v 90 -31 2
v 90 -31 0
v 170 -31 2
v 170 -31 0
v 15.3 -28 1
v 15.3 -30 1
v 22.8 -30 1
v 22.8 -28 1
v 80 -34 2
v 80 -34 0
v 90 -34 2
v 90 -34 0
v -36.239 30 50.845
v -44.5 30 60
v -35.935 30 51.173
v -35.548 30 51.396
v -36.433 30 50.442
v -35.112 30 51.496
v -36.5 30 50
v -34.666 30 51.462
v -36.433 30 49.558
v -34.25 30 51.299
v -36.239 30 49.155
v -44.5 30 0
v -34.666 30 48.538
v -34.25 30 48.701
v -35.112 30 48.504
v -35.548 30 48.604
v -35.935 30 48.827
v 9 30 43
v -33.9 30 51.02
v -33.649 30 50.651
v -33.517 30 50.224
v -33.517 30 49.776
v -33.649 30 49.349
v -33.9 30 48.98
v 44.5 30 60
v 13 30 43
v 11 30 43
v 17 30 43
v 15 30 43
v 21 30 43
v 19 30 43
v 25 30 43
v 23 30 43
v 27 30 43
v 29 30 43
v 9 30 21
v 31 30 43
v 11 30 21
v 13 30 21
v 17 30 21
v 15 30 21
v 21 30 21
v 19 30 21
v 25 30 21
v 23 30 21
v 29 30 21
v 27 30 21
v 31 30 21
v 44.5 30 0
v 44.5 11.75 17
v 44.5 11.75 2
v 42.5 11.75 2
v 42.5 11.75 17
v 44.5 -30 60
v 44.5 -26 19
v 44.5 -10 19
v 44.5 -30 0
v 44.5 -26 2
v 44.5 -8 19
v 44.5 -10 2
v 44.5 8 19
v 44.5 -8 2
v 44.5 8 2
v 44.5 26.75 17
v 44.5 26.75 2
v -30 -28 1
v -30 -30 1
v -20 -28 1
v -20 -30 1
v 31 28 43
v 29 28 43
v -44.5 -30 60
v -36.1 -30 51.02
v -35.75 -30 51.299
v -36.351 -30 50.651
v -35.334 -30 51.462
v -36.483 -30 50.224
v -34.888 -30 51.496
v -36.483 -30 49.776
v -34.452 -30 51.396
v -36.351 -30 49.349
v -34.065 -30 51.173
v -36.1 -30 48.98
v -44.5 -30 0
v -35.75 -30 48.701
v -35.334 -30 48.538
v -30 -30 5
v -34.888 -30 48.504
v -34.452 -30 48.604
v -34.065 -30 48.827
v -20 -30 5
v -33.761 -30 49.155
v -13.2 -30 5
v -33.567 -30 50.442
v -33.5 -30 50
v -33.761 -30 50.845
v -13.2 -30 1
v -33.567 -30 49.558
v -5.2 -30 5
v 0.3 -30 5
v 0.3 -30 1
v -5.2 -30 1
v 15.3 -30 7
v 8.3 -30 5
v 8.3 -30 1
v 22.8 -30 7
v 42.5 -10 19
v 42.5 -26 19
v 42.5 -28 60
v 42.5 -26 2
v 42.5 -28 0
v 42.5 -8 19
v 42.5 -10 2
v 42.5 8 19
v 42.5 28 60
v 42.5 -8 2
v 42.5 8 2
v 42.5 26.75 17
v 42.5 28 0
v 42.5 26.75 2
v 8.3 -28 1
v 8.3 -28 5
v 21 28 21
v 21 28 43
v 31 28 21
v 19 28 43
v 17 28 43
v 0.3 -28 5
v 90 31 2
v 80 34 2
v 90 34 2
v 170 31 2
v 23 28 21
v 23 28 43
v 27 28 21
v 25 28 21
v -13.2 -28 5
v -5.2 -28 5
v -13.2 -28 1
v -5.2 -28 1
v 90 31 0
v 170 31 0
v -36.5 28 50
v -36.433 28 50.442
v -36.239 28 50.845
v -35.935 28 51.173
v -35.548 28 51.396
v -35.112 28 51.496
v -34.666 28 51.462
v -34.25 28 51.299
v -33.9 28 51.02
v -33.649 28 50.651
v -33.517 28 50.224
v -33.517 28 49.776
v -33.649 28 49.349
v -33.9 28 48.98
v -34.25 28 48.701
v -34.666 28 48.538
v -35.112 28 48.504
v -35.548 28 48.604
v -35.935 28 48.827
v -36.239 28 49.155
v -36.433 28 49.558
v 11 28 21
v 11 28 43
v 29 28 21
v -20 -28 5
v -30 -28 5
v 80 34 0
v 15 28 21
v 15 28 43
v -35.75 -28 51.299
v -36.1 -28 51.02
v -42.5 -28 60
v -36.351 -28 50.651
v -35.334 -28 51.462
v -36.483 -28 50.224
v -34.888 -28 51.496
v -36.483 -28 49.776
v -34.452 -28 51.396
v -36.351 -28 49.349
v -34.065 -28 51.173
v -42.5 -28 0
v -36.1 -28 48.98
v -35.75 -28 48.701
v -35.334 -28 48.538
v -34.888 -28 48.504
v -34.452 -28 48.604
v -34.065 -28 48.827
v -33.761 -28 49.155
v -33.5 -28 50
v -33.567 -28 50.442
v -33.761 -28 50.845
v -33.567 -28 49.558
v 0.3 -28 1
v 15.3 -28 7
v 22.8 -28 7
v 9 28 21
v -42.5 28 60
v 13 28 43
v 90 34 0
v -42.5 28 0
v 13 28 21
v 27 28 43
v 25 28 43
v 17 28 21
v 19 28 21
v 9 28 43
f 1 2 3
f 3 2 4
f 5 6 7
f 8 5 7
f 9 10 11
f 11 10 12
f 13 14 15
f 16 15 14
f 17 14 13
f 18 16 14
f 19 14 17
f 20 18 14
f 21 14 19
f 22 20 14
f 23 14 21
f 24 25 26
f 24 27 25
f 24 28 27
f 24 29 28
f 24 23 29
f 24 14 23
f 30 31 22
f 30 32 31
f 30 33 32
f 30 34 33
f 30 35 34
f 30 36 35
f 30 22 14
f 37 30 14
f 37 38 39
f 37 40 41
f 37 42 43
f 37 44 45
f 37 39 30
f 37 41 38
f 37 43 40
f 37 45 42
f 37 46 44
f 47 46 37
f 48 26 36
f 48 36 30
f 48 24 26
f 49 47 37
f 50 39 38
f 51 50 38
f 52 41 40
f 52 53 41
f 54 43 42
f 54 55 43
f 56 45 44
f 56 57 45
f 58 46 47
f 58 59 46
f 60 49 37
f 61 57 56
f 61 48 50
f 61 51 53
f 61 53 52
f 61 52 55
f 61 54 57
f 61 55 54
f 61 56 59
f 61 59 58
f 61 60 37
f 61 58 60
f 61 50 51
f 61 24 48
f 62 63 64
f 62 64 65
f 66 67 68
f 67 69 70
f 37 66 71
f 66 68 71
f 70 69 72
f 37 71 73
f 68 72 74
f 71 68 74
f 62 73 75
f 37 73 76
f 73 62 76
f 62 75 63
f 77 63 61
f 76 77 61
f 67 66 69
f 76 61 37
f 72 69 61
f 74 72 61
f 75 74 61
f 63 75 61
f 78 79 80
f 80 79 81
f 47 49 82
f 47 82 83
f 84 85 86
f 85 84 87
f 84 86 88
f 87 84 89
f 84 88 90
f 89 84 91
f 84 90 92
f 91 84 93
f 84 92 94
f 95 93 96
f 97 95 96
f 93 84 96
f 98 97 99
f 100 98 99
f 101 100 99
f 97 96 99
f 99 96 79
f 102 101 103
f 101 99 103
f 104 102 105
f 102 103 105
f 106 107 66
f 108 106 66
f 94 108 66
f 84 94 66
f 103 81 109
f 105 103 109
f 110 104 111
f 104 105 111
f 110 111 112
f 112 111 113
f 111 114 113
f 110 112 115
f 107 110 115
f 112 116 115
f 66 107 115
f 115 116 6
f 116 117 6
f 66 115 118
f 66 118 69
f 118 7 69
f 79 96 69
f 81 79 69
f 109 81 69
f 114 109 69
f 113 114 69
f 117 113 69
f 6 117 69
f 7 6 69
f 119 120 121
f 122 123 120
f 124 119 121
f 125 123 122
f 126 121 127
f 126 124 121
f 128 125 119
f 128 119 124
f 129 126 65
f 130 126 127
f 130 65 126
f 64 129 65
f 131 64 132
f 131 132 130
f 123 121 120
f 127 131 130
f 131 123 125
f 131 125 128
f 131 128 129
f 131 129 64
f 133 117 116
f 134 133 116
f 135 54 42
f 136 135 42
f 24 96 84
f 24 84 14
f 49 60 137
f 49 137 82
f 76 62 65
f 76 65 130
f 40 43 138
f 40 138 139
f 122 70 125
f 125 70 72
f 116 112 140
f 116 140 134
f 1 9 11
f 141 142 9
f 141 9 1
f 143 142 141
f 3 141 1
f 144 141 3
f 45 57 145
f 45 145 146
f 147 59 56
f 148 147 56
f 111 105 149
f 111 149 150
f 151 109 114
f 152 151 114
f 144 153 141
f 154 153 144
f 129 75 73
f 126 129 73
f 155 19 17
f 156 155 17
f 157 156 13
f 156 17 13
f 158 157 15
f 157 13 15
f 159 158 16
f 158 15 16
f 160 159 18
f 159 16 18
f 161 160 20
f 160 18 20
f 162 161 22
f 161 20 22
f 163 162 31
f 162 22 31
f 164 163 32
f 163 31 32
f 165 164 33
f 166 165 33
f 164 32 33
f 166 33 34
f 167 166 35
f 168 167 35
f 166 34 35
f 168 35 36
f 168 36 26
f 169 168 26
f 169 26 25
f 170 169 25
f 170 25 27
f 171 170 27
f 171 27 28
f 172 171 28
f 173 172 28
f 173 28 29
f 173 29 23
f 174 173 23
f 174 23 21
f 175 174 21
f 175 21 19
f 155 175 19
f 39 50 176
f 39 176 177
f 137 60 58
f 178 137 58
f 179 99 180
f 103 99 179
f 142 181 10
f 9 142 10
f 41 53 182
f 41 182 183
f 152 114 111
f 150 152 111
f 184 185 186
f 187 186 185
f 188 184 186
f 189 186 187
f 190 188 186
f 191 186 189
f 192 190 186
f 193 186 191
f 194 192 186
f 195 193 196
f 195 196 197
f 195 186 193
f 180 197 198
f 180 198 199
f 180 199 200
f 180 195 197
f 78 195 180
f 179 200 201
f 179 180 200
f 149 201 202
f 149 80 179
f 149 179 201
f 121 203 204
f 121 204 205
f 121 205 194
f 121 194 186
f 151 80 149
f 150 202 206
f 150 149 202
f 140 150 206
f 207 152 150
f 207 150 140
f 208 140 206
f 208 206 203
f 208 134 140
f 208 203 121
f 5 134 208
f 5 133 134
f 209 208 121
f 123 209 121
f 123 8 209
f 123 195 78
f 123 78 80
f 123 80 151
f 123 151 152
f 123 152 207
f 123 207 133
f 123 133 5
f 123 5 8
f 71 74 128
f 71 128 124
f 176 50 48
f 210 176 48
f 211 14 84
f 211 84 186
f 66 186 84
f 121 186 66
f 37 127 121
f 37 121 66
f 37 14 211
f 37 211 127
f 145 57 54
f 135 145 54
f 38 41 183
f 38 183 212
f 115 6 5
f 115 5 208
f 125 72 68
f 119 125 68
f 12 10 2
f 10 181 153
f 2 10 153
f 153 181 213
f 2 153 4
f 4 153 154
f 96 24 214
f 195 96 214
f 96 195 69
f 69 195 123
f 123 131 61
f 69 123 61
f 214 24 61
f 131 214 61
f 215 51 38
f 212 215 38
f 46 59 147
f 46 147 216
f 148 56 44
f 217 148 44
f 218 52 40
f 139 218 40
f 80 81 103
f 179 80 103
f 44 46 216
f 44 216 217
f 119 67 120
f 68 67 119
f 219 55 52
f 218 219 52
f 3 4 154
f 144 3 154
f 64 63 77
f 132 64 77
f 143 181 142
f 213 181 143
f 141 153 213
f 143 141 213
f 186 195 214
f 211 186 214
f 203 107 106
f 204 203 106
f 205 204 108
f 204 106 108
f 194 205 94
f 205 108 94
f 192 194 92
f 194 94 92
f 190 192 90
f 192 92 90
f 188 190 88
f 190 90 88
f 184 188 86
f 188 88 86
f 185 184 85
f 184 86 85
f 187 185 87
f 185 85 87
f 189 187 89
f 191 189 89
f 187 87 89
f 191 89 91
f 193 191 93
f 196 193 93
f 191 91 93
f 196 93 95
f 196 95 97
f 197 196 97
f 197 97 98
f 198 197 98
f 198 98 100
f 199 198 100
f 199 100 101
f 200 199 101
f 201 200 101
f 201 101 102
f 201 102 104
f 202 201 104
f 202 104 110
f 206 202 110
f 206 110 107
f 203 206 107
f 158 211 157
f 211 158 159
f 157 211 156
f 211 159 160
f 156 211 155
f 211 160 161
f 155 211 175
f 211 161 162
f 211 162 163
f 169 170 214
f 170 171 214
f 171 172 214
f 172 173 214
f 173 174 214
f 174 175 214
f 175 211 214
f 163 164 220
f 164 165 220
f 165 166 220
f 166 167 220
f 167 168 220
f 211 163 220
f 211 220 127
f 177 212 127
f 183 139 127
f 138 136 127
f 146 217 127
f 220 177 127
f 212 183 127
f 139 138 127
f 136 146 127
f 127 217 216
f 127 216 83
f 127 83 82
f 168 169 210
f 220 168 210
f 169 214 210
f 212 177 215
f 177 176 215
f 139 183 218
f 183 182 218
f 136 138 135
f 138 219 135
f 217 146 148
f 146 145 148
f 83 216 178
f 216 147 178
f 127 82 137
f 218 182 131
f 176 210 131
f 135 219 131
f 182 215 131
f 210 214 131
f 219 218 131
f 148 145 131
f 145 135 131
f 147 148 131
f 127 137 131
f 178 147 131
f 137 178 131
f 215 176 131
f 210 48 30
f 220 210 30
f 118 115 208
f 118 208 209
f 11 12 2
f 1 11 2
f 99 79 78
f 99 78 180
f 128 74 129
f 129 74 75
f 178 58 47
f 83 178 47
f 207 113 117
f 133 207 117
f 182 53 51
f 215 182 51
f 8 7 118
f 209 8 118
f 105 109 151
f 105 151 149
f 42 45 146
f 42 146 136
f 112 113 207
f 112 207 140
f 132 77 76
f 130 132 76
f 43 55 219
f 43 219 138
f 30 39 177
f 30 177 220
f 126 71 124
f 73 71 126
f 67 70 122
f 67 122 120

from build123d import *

# Parameters (mm, degrees)
SKETCH_W        = 89
SKETCH_H        = 60
SKETCH_W_2      = 85
SKETCH_H_2      = 56
PAD_DEPTH       = 60
SKETCH001_R     = 1.5
SKETCH001_W     = 10
SKETCH001_H     = 4
SKETCH001_W_2   = 8
SKETCH001_W_3   = 7.5
SKETCH001_H_2   = 6
POCKET_DEPTH    = 5
SKETCH002_W     = 16
SKETCH002_H     = 17
SKETCH002_W_2   = 15
SKETCH002_H_2   = 15
POCKET001_DEPTH = 5
SKETCH003_R     = 1.5
SKETCH003_W     = 2
SKETCH003_H     = 22
POCKET002_DEPTH = 5
SKETCH004_W     = 90
SKETCH004_H     = 62
SKETCH004_W_2   = 10
SKETCH004_H_2   = 3
PAD001_DEPTH    = 2


with BuildPart() as pereti_carcasa:
    # Sketch → Pad (new body)
    with BuildSketch(Plane.XY):
        Rectangle(SKETCH_W, SKETCH_H)
        Rectangle(SKETCH_W_2, SKETCH_H_2, mode=Mode.SUBTRACT)
    extrude(amount=PAD_DEPTH)

    # Sketch001 (on Face3 of Pad) → Pocket (cut)
    with BuildSketch(Plane.XZ.offset(30)):
        with Locations((-35, 50)):
            Circle(SKETCH001_R)
        with Locations((-25, 3)):
            Rectangle(SKETCH001_W, SKETCH001_H)
        with Locations((-9.2, 3)):
            Rectangle(SKETCH001_W_2, SKETCH001_H)
        with Locations((4.3, 3)):
            Rectangle(SKETCH001_W_2, SKETCH001_H)
        with Locations((19.05, 4)):
            Rectangle(SKETCH001_W_3, SKETCH001_H_2)
    extrude(amount=-POCKET_DEPTH, mode=Mode.SUBTRACT)

    # Sketch002 (on Face3 of Pocket) → Pocket001 (cut)
    with BuildSketch(Plane.YZ.offset(44.5)):
        with Locations((-18, 10.5)):
            Rectangle(SKETCH002_W, SKETCH002_H)
        with Locations((0, 10.5)):
            Rectangle(SKETCH002_W, SKETCH002_H)
        with Locations((19.25, 9.5)):
            Rectangle(SKETCH002_W_2, SKETCH002_H_2)
    extrude(amount=-POCKET001_DEPTH, mode=Mode.SUBTRACT)

    # Sketch003 (on Face1 of Pocket001) → Pocket002 (cut)
    with BuildSketch(Plane(origin=(0, 30, 0), x_dir=(-1, 0, 0), z_dir=(0, 1, 0))):
        with Locations((35, 50)):
            Circle(SKETCH003_R)
        with Locations((-30, 32)):
            Rectangle(SKETCH003_W, SKETCH003_H)
        with Locations((-26, 32)):
            Rectangle(SKETCH003_W, SKETCH003_H)
        with Locations((-22, 32)):
            Rectangle(SKETCH003_W, SKETCH003_H)
        with Locations((-18, 32)):
            Rectangle(SKETCH003_W, SKETCH003_H)
        with Locations((-14, 32)):
            Rectangle(SKETCH003_W, SKETCH003_H)
        with Locations((-10, 32)):
            Rectangle(SKETCH003_W, SKETCH003_H)
    extrude(amount=-POCKET002_DEPTH, mode=Mode.SUBTRACT)


with BuildPart() as lid:
    # Sketch004 → Pad001 (new body)
    with BuildSketch(Plane.XY):
        with Locations((125, 0)):
            Rectangle(SKETCH004_W, SKETCH004_H)
        with Locations((85, 32.5)):
            Rectangle(SKETCH004_W_2, SKETCH004_H_2)
        with Locations((85, -32.5)):
            Rectangle(SKETCH004_W_2, SKETCH004_H_2)
    extrude(amount=PAD001_DEPTH)


solid = Compound([pereti_carcasa.part, lid.part])
